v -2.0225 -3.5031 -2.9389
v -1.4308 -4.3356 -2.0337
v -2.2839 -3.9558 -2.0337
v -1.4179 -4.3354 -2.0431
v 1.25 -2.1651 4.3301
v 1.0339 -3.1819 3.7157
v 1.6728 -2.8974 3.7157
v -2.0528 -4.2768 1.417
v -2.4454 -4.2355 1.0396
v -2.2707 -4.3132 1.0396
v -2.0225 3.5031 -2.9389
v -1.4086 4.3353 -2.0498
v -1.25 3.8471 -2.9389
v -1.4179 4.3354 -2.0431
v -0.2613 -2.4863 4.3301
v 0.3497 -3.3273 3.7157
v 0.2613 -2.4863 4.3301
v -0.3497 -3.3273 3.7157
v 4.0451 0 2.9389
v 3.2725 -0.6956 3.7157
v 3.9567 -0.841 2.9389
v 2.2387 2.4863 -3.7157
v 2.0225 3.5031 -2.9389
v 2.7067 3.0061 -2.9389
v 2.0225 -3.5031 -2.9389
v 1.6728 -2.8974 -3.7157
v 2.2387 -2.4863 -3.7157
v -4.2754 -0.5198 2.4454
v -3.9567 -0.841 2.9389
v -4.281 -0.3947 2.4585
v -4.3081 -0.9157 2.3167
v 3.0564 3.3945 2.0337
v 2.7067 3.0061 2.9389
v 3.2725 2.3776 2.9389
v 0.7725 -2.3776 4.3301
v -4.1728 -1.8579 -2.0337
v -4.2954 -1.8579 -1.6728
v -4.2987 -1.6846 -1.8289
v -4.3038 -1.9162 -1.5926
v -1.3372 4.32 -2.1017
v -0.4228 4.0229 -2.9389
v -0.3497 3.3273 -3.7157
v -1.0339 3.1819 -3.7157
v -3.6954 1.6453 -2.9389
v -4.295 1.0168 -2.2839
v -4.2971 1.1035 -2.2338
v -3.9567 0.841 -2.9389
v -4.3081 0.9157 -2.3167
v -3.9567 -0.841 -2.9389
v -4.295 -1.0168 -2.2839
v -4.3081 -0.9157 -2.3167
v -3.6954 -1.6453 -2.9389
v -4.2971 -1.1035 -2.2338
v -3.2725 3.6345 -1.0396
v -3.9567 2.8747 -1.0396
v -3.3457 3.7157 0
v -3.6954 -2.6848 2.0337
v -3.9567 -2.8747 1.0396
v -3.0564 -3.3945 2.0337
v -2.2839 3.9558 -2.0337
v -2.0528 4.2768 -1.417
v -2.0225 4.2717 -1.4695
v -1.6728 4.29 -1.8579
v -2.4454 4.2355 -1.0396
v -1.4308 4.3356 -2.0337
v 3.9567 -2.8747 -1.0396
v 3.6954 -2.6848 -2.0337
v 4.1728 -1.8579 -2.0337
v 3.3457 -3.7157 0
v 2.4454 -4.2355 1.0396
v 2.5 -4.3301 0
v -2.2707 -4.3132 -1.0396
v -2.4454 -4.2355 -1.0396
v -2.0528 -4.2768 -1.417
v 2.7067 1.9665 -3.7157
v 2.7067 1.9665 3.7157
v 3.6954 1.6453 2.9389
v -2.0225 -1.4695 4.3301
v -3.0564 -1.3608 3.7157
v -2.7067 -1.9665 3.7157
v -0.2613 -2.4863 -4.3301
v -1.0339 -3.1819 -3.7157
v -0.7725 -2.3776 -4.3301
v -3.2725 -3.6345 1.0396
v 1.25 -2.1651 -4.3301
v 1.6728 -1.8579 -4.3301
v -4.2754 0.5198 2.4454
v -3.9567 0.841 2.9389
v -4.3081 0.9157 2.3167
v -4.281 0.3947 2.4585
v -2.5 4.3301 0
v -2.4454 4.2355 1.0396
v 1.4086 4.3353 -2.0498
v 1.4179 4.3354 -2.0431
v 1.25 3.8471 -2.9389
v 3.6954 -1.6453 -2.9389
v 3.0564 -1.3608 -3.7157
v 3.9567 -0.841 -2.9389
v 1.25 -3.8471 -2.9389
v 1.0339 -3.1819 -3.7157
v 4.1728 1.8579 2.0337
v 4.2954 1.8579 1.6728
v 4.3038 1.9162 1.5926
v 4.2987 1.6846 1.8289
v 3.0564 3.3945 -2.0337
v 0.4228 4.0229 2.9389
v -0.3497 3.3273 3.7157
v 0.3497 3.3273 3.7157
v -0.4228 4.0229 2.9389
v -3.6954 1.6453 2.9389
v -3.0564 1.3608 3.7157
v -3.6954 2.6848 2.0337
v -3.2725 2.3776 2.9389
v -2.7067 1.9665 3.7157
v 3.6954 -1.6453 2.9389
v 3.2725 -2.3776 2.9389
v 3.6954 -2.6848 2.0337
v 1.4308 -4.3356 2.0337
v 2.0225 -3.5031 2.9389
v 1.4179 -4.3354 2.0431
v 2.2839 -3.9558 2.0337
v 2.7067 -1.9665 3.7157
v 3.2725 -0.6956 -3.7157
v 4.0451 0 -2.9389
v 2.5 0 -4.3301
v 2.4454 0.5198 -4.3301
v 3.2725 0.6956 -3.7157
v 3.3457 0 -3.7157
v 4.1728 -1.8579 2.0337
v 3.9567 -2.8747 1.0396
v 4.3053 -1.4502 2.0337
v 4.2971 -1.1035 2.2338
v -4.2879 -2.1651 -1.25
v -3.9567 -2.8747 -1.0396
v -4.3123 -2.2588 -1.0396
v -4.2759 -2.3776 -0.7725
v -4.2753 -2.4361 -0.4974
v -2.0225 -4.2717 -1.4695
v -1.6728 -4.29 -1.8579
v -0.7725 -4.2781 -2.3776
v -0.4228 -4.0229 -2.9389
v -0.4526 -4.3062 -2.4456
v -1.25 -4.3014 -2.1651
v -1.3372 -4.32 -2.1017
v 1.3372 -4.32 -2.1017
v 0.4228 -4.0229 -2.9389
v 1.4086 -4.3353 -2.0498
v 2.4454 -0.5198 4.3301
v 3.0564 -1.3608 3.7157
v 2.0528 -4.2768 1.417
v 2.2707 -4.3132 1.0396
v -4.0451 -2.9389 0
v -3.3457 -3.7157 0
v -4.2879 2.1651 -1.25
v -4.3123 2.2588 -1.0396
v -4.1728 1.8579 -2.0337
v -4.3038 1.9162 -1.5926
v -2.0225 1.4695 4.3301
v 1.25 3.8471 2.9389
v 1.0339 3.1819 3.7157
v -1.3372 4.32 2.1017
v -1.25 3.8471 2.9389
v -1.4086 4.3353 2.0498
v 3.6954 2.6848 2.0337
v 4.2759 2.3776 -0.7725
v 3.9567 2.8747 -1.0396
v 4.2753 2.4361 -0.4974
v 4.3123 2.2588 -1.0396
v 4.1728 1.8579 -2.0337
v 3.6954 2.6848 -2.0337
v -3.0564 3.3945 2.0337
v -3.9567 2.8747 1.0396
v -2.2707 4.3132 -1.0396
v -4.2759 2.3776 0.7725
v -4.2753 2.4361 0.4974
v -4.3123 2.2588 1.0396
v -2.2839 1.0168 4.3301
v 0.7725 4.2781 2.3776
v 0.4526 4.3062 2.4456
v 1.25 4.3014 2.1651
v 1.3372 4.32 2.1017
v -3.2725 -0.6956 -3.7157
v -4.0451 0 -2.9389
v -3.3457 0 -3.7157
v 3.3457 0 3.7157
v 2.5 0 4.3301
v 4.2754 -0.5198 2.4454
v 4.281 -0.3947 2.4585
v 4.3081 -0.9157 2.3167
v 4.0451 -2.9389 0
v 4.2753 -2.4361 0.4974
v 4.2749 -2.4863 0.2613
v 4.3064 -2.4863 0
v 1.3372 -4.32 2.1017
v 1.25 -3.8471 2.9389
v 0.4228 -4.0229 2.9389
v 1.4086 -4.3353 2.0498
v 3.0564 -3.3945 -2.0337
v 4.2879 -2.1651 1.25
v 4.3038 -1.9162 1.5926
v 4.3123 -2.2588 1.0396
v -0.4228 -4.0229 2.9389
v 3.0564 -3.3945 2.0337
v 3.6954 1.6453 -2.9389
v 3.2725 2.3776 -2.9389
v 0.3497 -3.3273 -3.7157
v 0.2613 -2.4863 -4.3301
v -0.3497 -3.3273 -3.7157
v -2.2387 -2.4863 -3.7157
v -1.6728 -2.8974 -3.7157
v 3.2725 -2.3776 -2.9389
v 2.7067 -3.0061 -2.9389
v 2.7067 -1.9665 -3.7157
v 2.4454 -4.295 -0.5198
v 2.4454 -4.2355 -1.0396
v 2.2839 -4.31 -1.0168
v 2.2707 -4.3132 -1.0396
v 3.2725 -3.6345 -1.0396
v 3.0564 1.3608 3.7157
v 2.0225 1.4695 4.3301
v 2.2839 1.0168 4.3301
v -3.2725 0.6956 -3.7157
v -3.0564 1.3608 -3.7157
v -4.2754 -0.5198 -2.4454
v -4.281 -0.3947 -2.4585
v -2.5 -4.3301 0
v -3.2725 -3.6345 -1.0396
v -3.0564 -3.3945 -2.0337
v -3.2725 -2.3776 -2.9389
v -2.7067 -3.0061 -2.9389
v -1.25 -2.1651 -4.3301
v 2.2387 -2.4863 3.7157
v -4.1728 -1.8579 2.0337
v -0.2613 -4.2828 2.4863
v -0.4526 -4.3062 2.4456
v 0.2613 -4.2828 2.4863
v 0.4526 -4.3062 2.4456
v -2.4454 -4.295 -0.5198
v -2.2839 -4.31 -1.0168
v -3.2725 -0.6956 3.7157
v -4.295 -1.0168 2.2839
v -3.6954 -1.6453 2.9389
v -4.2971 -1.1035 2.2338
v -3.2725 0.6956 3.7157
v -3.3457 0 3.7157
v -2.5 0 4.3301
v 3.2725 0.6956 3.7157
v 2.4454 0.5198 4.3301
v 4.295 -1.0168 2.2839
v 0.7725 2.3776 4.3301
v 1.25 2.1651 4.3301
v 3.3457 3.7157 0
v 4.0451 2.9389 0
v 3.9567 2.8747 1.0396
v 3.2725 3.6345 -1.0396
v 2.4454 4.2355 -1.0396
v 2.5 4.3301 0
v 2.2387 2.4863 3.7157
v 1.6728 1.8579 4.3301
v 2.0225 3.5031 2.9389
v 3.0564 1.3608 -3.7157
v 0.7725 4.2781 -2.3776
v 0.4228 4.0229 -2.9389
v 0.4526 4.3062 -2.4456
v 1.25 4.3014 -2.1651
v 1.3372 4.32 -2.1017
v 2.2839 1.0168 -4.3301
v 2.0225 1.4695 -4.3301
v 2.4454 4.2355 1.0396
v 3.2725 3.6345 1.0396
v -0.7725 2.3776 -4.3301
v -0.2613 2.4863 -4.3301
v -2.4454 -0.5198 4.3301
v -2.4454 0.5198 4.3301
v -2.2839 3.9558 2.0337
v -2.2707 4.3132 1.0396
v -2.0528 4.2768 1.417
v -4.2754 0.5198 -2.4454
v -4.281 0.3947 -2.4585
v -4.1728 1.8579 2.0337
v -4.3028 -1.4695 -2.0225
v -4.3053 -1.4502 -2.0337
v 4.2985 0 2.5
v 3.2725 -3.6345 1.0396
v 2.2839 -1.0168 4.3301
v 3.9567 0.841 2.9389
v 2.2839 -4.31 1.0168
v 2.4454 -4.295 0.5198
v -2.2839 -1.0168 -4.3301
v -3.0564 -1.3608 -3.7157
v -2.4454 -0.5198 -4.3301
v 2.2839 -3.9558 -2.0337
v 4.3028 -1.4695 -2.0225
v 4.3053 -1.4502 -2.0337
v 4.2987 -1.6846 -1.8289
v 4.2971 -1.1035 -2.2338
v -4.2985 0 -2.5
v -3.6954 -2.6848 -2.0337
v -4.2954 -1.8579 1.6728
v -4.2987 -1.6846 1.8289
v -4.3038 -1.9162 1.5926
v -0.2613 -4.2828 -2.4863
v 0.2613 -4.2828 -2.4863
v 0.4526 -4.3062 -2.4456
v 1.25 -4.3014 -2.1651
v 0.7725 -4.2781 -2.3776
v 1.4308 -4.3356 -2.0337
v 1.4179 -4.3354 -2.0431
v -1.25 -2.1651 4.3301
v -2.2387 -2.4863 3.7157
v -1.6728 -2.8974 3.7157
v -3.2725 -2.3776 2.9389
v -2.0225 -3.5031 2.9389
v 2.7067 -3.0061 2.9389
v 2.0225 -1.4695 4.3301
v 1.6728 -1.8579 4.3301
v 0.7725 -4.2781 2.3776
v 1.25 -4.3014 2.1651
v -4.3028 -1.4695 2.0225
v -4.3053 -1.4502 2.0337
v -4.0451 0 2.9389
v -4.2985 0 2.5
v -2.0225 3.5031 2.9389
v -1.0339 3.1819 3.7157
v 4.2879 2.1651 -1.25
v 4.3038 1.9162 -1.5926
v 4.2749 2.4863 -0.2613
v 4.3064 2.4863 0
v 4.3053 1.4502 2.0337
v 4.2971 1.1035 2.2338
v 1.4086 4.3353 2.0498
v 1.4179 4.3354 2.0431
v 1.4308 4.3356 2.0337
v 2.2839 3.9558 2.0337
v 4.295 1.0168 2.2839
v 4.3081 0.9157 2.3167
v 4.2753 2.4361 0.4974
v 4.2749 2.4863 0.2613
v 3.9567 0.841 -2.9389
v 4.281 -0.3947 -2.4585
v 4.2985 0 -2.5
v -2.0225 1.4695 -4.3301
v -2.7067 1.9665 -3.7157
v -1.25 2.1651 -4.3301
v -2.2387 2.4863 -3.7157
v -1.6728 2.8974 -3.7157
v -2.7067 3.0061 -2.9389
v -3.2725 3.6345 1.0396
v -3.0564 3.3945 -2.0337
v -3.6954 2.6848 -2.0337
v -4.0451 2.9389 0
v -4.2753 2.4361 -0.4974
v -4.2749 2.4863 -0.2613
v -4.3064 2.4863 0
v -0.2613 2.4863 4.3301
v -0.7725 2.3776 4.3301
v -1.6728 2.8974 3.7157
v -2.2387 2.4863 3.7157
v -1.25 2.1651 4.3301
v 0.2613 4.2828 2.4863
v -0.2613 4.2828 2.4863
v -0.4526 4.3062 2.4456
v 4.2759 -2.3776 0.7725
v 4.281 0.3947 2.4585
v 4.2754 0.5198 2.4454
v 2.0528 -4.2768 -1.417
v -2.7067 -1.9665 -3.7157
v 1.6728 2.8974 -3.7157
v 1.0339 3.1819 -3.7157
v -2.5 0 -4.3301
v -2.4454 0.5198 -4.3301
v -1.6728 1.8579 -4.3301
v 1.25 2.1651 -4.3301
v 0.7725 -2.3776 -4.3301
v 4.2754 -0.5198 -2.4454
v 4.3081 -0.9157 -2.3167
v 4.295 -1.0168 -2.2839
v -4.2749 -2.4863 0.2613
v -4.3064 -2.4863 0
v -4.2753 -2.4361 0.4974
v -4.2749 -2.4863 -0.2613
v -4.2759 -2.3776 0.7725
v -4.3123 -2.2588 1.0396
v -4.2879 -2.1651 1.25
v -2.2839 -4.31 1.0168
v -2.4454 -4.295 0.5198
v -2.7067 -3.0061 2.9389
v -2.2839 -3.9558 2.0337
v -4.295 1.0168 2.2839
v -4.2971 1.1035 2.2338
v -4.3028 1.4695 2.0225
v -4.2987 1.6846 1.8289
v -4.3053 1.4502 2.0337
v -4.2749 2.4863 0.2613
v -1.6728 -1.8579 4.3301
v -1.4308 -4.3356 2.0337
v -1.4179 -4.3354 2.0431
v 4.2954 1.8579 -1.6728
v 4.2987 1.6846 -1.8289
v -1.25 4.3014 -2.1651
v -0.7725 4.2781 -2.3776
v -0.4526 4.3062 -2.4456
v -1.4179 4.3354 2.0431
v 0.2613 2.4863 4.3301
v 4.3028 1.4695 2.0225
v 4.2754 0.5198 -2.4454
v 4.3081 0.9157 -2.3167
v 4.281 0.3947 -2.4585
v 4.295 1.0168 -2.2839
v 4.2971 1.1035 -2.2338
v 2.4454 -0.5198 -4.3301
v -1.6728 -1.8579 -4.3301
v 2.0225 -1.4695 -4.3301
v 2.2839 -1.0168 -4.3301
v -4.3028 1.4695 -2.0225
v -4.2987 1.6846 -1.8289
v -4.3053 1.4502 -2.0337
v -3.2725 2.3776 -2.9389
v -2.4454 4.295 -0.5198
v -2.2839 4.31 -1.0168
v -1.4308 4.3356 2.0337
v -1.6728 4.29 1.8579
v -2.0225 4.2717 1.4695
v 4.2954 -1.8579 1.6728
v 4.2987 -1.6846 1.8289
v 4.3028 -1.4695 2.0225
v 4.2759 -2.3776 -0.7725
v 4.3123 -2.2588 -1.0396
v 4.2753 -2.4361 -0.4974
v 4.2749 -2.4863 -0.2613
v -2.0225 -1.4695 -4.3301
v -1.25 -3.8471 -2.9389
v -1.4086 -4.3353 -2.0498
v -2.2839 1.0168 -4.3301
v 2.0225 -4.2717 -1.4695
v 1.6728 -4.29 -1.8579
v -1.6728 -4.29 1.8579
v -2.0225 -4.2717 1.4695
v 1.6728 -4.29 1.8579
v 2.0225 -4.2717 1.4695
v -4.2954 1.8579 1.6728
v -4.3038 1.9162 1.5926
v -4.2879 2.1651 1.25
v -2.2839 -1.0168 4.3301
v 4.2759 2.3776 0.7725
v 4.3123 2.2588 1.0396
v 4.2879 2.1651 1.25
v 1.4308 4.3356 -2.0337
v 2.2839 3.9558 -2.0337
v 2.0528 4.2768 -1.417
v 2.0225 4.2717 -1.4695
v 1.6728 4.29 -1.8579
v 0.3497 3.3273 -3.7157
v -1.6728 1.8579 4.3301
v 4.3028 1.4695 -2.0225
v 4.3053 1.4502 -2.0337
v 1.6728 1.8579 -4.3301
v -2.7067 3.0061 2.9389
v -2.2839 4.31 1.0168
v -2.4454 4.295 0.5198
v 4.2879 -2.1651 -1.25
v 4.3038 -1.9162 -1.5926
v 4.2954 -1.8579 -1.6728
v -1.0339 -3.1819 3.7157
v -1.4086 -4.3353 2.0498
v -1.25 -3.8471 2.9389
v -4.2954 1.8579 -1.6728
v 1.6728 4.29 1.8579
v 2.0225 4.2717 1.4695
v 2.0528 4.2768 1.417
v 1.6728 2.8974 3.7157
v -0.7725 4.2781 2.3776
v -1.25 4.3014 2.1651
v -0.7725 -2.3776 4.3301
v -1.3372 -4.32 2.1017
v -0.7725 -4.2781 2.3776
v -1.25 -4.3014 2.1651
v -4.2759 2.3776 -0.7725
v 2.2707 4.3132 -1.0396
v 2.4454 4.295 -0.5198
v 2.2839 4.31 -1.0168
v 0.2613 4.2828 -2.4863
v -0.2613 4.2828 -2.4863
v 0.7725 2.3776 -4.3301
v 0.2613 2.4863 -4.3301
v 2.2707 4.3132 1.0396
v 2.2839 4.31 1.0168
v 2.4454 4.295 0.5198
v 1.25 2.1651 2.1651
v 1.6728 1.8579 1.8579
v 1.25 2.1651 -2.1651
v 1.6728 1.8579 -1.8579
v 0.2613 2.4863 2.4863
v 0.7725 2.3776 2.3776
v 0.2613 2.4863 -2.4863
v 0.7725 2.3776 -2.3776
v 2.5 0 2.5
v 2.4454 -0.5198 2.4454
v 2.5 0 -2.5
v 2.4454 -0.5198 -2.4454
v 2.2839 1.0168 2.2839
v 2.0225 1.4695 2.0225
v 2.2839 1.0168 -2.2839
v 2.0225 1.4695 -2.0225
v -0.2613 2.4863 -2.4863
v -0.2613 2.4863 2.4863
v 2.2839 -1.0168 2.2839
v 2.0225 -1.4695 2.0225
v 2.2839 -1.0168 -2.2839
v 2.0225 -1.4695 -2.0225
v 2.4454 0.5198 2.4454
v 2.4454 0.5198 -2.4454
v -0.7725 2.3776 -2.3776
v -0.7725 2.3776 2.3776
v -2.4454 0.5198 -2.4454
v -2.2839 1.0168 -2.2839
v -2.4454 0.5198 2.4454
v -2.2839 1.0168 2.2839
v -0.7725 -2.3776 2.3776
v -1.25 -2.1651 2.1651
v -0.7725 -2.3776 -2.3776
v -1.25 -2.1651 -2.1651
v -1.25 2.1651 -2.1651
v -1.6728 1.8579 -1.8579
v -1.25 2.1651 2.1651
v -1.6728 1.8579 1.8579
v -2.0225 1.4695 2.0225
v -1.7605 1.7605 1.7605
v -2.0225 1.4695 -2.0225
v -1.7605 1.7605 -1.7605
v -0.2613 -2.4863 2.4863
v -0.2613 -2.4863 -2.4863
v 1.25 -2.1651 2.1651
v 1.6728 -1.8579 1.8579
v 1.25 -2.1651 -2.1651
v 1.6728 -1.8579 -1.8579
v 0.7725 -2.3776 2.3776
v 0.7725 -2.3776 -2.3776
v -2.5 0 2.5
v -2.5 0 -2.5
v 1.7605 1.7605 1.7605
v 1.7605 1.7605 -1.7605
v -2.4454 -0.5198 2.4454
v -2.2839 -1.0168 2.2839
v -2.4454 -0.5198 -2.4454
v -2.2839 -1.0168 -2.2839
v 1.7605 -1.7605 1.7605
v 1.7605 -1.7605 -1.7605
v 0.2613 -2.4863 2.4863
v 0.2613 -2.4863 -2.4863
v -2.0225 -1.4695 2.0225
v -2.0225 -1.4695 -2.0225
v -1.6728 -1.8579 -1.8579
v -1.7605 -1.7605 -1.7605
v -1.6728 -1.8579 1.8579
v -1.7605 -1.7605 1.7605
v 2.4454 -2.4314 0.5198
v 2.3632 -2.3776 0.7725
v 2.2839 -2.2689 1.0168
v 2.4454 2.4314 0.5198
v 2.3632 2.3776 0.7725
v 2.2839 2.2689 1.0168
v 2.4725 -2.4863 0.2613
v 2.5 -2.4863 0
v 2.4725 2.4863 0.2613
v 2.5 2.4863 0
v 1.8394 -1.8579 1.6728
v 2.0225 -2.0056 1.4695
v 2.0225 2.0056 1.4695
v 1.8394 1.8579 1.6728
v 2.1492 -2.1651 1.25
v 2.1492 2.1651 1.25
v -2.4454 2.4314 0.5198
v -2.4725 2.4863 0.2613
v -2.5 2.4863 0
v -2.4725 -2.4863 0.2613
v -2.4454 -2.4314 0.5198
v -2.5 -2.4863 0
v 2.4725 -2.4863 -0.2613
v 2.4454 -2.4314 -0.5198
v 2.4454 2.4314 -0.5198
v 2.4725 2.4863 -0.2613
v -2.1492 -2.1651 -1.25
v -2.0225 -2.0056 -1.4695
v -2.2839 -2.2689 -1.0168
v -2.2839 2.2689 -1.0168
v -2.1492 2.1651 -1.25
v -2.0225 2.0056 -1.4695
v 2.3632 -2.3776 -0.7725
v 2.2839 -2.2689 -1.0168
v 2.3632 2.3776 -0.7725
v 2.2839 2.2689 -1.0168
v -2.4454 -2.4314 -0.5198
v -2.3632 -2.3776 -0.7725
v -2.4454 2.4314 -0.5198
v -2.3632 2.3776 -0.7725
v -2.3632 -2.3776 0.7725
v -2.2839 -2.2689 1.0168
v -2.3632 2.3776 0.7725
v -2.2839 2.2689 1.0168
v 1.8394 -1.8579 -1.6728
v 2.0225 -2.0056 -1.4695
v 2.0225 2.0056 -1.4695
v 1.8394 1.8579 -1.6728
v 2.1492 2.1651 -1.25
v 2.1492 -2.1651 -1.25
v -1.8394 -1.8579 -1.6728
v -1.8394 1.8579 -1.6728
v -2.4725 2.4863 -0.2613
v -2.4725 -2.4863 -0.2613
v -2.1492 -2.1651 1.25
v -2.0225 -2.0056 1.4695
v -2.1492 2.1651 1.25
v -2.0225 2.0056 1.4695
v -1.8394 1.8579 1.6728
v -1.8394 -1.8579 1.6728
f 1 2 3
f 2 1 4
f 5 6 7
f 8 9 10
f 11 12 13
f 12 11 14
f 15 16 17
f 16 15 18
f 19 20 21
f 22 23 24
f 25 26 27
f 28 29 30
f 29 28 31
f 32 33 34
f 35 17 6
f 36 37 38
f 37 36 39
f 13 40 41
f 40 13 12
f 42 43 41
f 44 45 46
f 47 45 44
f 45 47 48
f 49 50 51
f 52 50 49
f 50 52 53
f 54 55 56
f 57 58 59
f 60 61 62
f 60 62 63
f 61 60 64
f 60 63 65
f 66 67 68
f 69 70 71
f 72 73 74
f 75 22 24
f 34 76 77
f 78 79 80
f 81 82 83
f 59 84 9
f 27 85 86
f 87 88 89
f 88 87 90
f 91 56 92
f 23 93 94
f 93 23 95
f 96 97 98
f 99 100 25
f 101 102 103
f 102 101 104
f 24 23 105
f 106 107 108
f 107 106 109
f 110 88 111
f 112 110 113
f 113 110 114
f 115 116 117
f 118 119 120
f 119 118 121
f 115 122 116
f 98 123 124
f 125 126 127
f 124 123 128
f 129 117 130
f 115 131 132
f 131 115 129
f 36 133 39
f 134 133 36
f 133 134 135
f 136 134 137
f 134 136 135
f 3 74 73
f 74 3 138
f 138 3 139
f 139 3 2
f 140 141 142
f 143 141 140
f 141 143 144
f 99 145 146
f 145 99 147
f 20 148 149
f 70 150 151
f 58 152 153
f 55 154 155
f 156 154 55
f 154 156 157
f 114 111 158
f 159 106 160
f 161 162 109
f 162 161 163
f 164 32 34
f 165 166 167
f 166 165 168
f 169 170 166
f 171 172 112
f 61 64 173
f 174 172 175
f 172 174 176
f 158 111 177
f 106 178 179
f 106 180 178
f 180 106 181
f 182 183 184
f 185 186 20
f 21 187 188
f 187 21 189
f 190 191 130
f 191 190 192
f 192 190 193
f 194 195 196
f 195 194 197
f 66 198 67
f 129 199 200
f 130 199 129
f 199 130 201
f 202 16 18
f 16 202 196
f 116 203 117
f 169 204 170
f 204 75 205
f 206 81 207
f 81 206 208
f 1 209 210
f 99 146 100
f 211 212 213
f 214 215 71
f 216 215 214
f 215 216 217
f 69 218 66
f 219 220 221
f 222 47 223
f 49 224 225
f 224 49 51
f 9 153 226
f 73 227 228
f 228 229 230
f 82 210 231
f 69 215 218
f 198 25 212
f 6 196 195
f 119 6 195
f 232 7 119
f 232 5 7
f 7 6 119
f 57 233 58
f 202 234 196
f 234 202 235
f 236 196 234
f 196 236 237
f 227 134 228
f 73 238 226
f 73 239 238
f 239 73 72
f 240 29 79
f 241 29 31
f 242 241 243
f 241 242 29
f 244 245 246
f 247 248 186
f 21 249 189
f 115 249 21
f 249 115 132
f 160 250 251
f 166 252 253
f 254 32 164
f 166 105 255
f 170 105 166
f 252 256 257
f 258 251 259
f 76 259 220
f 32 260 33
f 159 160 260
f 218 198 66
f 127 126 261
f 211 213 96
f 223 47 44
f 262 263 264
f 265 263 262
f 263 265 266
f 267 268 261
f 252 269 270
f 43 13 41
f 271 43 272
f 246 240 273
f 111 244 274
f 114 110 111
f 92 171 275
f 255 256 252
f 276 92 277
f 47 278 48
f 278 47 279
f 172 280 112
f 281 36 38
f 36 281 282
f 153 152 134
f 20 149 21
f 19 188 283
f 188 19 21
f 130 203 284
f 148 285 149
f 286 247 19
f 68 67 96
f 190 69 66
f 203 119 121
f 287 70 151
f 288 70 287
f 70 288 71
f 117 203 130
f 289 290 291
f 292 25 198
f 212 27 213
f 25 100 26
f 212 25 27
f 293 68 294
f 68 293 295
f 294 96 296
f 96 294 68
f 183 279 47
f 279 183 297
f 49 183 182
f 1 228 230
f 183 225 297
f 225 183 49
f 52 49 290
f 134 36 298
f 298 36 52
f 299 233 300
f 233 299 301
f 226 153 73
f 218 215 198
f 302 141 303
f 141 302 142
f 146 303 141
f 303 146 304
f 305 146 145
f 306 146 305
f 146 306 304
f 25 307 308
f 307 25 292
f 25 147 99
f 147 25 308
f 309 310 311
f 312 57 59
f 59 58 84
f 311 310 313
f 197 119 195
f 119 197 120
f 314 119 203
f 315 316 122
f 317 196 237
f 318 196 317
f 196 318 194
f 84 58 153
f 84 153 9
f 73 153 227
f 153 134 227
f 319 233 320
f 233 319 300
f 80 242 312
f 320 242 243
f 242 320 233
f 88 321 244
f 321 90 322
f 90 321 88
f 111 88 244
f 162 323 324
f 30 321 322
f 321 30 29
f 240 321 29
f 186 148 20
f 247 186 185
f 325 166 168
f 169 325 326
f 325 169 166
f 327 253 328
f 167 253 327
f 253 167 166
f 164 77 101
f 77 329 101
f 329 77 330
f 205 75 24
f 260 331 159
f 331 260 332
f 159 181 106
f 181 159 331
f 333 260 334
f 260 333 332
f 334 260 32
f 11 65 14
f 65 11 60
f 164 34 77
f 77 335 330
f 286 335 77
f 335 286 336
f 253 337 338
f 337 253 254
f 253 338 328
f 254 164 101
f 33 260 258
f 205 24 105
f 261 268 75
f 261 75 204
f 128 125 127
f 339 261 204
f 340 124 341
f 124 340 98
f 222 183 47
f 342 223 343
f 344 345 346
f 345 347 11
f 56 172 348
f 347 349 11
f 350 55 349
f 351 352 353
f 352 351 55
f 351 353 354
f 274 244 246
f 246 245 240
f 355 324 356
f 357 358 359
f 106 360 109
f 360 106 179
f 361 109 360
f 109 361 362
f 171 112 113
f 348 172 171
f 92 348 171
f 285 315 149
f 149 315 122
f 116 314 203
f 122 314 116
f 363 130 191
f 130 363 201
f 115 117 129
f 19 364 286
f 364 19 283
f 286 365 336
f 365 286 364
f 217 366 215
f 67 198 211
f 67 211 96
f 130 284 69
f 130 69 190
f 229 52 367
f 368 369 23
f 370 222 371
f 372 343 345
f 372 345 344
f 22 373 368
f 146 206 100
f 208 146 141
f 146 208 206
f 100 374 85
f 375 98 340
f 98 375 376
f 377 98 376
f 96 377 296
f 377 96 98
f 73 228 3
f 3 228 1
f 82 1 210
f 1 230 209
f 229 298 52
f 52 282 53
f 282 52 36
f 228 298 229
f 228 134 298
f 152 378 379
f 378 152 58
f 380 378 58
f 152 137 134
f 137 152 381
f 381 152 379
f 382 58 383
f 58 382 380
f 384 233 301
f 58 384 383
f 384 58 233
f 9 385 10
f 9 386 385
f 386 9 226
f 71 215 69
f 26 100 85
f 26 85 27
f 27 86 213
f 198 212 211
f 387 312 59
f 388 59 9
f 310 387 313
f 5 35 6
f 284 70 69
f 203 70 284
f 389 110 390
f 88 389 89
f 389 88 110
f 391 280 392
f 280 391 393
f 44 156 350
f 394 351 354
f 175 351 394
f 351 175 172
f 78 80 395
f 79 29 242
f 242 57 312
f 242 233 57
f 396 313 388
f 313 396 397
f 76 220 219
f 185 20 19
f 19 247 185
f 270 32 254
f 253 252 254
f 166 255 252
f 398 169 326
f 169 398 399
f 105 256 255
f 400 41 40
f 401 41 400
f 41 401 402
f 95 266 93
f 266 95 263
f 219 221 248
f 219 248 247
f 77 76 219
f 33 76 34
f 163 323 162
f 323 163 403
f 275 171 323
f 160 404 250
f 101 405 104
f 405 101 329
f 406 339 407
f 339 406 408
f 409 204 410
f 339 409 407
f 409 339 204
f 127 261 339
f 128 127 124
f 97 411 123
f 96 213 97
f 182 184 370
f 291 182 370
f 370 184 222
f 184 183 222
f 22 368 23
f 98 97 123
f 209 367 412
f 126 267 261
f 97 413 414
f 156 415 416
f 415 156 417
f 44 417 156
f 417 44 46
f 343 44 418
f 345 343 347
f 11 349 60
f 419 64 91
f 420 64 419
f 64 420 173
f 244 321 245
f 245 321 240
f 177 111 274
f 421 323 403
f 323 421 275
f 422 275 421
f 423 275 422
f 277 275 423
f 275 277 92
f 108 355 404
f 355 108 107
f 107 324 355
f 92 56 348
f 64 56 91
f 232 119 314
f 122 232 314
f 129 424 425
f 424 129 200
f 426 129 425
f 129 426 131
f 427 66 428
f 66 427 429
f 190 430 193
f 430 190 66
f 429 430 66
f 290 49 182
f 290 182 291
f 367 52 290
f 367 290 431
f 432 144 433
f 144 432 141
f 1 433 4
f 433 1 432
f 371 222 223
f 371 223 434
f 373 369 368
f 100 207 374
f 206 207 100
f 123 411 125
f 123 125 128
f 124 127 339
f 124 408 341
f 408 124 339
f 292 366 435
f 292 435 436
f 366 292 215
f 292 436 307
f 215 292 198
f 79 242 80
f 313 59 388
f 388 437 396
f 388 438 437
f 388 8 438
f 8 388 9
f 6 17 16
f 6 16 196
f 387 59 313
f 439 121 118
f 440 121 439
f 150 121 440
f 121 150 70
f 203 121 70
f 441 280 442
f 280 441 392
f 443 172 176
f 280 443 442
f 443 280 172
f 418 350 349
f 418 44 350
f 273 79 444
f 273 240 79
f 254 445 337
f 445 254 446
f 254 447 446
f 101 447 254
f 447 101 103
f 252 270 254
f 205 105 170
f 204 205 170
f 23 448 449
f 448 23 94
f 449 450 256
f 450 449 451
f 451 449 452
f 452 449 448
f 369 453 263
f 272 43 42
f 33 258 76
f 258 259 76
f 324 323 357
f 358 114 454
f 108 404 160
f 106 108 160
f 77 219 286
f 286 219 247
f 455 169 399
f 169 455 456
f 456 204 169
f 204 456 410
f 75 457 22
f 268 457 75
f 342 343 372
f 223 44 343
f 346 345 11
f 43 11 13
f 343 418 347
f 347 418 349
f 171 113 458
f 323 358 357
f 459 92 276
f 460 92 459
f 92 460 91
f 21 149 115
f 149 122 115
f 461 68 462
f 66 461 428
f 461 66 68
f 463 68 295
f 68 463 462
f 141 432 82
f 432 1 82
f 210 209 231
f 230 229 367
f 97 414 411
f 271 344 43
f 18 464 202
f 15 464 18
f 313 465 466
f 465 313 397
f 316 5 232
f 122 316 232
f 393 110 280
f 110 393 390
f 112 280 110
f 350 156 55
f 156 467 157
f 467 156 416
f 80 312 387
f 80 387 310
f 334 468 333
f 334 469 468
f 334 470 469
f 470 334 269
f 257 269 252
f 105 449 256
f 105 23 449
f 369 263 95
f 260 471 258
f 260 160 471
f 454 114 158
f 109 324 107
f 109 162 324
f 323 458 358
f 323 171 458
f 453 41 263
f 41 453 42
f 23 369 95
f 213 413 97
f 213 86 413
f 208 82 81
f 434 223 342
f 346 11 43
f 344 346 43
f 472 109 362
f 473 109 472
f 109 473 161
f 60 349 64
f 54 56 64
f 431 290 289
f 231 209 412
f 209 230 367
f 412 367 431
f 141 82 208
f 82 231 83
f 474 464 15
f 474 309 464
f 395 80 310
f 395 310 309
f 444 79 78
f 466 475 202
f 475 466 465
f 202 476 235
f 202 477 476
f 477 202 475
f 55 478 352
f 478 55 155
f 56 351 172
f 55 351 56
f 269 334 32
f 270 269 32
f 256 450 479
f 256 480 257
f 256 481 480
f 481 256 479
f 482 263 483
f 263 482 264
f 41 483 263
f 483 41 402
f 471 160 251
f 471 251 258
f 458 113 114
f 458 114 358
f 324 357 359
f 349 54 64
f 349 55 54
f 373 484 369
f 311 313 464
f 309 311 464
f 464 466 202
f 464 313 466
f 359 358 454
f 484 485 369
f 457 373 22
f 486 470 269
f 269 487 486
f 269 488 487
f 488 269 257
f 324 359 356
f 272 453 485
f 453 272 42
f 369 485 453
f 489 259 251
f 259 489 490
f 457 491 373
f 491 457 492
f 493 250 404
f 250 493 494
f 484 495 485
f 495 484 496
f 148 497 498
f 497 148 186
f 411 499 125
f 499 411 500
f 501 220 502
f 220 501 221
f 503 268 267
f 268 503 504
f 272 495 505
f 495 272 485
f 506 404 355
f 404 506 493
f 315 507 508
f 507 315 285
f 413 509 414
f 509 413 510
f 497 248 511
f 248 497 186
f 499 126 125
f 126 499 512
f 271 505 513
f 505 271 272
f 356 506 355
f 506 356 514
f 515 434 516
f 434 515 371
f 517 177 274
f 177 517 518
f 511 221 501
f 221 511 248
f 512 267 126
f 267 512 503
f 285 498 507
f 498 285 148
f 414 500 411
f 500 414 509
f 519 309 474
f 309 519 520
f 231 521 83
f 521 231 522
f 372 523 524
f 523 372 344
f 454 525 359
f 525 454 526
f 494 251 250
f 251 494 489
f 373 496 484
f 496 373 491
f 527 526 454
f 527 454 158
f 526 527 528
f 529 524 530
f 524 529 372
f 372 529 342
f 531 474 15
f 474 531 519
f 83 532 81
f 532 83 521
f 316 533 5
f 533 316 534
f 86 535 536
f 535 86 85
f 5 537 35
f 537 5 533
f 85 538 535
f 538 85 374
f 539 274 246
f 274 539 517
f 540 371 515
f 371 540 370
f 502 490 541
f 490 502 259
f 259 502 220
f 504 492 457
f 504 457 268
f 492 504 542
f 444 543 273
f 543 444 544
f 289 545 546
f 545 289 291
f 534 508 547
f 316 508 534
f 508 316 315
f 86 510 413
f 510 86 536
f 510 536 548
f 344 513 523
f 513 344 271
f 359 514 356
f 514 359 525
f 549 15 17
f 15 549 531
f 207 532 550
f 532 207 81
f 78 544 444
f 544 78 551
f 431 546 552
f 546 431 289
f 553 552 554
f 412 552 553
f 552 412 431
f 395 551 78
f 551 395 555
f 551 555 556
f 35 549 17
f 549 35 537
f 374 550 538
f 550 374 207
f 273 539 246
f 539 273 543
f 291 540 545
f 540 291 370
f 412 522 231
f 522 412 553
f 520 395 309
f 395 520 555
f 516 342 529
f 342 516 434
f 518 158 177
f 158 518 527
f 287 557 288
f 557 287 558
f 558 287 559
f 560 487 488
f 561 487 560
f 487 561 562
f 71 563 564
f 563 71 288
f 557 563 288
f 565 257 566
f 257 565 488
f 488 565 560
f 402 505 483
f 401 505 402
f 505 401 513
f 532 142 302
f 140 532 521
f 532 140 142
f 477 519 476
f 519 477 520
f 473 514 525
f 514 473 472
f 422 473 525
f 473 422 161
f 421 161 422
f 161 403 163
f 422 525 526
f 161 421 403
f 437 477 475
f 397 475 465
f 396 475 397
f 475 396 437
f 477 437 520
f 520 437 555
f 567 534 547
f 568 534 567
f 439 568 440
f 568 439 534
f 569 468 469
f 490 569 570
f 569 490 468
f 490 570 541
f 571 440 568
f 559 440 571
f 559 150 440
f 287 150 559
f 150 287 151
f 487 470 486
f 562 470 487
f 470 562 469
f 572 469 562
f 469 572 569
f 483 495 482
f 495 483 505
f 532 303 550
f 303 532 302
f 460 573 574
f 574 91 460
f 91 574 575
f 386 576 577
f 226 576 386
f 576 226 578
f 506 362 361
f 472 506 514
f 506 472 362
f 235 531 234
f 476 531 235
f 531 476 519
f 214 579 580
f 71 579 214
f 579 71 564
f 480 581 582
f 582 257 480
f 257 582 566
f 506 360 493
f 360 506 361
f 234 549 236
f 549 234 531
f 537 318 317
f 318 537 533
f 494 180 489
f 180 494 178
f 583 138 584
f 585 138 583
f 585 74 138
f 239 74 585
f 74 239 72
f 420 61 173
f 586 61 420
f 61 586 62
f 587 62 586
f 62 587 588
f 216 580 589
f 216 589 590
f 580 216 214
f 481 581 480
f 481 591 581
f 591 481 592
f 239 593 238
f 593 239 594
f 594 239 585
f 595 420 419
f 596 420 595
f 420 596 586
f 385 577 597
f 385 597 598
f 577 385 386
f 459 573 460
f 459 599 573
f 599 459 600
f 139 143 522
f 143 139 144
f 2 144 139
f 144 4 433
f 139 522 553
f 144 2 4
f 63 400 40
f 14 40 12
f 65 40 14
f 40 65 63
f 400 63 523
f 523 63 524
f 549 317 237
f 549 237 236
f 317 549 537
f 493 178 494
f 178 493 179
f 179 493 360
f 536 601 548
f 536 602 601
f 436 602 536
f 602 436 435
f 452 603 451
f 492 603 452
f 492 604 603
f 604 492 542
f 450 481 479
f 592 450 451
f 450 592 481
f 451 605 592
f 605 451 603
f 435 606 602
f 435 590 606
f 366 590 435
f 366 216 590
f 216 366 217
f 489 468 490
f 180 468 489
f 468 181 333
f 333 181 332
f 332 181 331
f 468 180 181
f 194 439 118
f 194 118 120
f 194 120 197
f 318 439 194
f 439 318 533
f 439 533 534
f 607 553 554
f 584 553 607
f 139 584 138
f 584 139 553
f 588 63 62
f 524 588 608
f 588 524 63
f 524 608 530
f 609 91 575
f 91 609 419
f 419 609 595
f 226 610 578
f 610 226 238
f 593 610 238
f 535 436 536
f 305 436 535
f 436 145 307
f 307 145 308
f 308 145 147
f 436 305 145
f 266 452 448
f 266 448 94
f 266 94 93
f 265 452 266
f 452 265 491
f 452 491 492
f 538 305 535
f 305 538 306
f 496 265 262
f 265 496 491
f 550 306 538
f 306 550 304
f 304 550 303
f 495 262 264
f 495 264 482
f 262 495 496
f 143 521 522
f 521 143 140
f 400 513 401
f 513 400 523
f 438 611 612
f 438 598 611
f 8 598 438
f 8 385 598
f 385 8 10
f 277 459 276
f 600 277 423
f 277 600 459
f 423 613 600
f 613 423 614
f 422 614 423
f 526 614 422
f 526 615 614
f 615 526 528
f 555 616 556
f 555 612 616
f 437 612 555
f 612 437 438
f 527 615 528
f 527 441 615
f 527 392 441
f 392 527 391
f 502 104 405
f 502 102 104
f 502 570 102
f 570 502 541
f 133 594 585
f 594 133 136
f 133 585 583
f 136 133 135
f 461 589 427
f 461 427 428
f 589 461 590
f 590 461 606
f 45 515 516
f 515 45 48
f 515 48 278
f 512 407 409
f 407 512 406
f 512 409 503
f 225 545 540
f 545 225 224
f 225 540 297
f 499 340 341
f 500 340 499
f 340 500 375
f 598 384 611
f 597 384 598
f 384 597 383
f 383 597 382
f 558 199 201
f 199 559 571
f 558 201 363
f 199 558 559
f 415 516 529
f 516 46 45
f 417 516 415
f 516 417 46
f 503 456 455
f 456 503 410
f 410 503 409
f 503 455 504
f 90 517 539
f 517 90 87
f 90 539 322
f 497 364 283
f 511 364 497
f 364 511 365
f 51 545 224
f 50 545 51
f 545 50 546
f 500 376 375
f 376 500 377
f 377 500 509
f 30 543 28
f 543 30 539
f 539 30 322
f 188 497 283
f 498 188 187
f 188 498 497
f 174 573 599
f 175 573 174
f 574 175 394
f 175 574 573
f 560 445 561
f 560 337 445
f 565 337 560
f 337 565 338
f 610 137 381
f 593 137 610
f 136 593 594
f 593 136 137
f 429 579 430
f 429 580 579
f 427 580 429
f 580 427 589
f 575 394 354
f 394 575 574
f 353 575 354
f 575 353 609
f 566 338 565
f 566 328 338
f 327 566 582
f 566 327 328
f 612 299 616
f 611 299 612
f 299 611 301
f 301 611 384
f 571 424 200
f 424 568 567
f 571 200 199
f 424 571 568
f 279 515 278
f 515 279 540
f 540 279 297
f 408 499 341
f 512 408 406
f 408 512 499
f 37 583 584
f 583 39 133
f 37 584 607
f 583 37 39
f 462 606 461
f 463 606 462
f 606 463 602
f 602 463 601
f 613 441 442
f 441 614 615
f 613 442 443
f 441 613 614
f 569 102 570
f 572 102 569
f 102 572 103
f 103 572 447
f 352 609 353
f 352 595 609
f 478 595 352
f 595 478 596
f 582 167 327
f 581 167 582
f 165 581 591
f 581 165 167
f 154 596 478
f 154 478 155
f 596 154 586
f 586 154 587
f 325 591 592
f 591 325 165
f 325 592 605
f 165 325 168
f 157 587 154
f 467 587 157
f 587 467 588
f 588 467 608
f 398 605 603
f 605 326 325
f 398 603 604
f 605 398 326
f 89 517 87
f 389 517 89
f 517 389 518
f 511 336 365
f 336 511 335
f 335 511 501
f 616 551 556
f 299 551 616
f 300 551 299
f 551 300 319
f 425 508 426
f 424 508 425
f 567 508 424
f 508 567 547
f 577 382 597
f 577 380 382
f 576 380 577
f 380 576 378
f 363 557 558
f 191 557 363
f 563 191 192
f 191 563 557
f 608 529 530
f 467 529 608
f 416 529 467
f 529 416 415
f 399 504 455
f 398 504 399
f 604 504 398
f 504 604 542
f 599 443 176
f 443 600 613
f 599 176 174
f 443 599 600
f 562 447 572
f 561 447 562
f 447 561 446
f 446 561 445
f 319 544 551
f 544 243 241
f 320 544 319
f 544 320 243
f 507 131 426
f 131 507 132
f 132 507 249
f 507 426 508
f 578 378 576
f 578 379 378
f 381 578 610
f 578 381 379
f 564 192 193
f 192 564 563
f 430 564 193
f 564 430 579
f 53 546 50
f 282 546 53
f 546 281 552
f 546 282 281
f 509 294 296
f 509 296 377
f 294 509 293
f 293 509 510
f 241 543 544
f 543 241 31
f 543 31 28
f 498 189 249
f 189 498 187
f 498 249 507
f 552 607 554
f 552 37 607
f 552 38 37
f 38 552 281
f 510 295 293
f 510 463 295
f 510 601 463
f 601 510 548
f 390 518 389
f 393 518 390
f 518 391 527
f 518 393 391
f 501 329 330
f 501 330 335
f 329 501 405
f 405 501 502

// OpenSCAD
$fn=30;
difference() {
	sphere(d=10);
	cylinder(h=15, d=5, center=true);
	rotate([90, 0]) cylinder(h=15, d=5, center=true);
	rotate([0, 90]) #cylinder(h=15, d=5, center=true);
}
